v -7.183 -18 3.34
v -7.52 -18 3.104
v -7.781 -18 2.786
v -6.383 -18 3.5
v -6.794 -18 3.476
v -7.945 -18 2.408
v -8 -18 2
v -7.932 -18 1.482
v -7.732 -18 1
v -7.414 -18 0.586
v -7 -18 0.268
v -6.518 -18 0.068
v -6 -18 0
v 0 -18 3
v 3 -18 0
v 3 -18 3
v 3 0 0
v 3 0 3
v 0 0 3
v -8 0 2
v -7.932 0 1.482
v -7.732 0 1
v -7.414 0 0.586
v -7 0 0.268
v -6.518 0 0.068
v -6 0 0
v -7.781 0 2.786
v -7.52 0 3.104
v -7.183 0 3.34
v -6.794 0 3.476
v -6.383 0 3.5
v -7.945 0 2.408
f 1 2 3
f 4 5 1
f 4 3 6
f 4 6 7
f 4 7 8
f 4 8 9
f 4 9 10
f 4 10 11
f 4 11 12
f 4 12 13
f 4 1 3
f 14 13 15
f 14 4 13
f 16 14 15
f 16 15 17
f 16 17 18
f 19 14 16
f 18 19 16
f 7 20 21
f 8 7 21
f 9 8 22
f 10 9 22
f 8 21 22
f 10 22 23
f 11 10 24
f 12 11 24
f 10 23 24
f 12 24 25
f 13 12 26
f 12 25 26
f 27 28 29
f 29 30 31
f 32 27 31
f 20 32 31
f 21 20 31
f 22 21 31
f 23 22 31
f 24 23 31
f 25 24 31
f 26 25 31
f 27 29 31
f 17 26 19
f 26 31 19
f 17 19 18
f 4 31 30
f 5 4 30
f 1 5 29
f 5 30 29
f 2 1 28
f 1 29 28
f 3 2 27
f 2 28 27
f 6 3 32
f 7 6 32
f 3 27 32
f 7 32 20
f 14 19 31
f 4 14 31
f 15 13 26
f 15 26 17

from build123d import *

# Parameters (mm, degrees)
F1_DEPTH = 60
F2_W     = 3
F2_H     = 3
F3_DEPTH = 60
F4_DEPTH = 42


with BuildPart() as f1:
    # F0 (on Front) → F1 (new body)
    with BuildSketch(Plane.XZ):
        with BuildLine():
            Line((-6, 0), (0, 0))
            Line((0, 0), (0, 3))
            Line((0, 3), (-6.3828637444, 3.5))
            ThreePointArc((-6.3828637444, 3.5), (-7.5200895217, 3.1043228005), (-8, 2))
            ThreePointArc((-8, 2), (-7.4142135624, 0.5857864376), (-6, 0))
        make_face()
    extrude(amount=F1_DEPTH)

    # F2 (on face) → F3 (join)
    with BuildSketch(Plane.XZ.offset(60)):
        with Locations((1.5, 1.5)):
            Rectangle(F2_W, F2_H)
    extrude(amount=-F3_DEPTH)

    # F4 (cut): a face of the model
    f4_faces = [f1.faces().sort_by_distance(p)[0] for p in [
        (-2.4940313384, -60, 1.6228930979),
    ]]
    extrude(f4_faces, amount=-F4_DEPTH, mode=Mode.SUBTRACT)


solid = f1.part
